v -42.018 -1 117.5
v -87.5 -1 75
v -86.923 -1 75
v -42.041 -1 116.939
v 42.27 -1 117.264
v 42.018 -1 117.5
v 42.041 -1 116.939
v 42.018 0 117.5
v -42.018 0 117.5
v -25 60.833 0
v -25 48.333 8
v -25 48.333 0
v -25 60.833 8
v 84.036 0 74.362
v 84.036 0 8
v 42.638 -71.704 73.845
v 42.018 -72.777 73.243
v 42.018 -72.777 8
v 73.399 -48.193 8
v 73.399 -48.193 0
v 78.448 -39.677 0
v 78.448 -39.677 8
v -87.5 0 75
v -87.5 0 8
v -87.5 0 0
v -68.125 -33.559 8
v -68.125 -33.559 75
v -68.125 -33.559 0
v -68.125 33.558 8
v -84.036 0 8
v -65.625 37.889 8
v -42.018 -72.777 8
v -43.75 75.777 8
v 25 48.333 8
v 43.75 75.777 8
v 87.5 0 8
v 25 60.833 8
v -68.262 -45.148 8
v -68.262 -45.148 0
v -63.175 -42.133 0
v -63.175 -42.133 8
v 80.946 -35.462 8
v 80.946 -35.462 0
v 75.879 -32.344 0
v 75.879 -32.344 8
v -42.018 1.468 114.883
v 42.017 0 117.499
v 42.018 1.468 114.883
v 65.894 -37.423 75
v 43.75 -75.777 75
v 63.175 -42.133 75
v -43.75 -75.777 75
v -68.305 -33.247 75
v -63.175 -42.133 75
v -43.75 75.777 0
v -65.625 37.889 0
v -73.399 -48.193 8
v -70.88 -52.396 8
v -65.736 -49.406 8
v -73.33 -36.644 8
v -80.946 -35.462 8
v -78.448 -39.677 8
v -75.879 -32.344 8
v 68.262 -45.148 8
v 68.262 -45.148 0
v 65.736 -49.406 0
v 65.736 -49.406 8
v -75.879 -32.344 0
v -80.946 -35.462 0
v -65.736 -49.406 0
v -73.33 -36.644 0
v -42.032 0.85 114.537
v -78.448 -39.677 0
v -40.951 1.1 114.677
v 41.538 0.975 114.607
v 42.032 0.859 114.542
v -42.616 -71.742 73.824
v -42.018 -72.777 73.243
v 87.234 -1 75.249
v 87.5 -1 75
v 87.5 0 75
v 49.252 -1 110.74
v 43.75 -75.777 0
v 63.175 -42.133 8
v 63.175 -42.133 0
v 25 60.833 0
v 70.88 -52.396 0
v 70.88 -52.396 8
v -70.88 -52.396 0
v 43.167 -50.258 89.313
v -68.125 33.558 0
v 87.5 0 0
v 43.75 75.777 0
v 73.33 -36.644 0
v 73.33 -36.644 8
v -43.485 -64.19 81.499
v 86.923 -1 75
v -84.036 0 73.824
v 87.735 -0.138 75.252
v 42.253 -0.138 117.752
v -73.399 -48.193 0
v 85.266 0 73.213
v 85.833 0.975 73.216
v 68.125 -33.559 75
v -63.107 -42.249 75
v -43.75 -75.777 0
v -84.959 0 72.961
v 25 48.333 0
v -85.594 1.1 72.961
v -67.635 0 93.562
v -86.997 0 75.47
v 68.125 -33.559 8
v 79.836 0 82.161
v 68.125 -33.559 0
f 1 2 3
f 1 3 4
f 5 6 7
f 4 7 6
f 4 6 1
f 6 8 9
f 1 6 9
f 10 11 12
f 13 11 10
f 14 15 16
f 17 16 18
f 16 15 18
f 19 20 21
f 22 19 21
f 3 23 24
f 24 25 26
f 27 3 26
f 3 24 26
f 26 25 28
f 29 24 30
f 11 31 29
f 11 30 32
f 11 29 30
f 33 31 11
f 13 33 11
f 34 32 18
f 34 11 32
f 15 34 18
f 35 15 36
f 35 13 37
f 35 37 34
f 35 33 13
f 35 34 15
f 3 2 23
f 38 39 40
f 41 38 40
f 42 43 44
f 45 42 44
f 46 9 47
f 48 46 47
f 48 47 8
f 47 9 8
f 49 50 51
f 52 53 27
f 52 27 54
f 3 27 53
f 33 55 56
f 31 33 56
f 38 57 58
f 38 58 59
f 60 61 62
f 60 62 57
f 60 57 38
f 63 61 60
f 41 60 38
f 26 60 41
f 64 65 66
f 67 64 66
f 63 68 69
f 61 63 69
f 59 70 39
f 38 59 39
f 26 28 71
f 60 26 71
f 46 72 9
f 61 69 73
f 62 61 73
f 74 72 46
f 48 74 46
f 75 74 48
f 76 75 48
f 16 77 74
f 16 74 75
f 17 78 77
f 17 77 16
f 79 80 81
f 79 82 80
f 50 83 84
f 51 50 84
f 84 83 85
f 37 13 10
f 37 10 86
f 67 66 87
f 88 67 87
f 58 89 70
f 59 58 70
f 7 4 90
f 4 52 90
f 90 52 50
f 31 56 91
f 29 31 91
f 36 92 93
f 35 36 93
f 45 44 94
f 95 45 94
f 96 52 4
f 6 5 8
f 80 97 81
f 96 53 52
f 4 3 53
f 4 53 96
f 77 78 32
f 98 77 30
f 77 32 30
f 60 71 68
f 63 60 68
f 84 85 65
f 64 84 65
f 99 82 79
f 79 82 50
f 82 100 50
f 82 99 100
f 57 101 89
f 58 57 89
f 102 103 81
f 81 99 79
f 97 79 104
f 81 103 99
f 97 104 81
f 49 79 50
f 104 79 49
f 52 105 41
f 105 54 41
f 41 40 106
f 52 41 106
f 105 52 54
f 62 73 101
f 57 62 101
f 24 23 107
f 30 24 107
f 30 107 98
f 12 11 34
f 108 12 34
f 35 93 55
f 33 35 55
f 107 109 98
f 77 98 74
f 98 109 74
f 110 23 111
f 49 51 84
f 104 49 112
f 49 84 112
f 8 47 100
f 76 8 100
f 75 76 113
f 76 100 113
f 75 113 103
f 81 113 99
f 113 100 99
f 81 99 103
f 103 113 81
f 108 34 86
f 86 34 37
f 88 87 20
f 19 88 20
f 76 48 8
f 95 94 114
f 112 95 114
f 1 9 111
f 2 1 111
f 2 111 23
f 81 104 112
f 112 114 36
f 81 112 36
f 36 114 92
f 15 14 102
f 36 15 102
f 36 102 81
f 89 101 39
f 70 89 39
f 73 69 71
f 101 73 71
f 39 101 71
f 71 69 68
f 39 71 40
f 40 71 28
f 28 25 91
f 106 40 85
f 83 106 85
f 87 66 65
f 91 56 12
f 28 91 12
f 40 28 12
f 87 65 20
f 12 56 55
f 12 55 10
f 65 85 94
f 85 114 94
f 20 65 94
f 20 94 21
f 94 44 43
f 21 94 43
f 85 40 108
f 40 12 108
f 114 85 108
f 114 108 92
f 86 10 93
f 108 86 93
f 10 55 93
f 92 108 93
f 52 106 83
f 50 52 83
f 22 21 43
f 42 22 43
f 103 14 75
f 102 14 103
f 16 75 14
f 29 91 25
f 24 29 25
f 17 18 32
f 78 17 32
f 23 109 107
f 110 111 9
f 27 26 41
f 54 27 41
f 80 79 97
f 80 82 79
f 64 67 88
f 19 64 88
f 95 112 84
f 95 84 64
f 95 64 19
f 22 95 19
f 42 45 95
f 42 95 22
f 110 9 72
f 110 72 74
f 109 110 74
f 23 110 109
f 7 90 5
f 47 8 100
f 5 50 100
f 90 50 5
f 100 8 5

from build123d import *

# Parameters (mm, degrees)
F0_W      = 50
F0_H      = 12.5
F1_DEPTH  = 8
F2_DEPTH  = 75
F4_DEPTH  = 8
F7_DEPTH  = 3
F8_DEPTH  = 1
F11_DEPTH = 3
F14_DEPTH = 3
F15_DEPTH = 8
F16_DEPTH = 8
F17_DEPTH = 12.5


with BuildPart() as f1:
    # F0 (on Top) → F1 (new body)
    with BuildSketch(Plane.XY):
        Polygon((42.017949, -72.777223), (84.035898, 0), (42.017949, 72.777223), (-42.017949, 72.777223), (-84.035898, 0), (-42.017949, -72.777223), align=None)
        with Locations((0, 54.582917)):
            Rectangle(F0_W, F0_H, mode=Mode.SUBTRACT)
    extrude(amount=F1_DEPTH)

    # F0 (on Top) → F2 (join)
    with BuildSketch(Plane.XY):
        Polygon((68.124673, -33.55905), (87.5, 0), (84.035898, 0), (42.017949, -72.777223), (-42.017949, -72.777223), (-84.035898, 0), (-87.5, 0), (-68.124673, -33.55905), (-63.174512, -42.132981), (-43.75, -75.777223), (43.75, -75.777223), (63.174512, -42.132981), align=None)
    extrude(amount=F2_DEPTH)

    # F0 (on Top) → F4 (join)
    with BuildSketch(Plane.XY):
        Polygon((43.75, 75.777223), (-43.75, 75.777223), (-65.625, 37.888611), (-68.125, 33.558484), (-87.5, 0), (-84.035898, 0), (-42.017949, 72.777223), (42.017949, 72.777223), (84.035898, 0), (87.5, 0), align=None)
    extrude(amount=F4_DEPTH)

    # F6 (on face) → F7 (join)
    with BuildSketch(Plane(origin=(0, -50.131237, 89.383668), x_dir=(1, 0, 0), z_dir=(0, 0.489171, -0.872188))):
        Polygon((43.75, 29.404192), (0, 29.404192), (-43.75, 29.404192), (-42.01795, -57.477552), (42.01795, -57.477552), align=None)
    extrude(amount=F7_DEPTH)

    # F3 (on Front) → F8 (join)
    with BuildSketch(Plane.XZ):
        Polygon((-42.01795, 114.5), (0, 114.5), (42.01795, 114.5), (84.0359, 75), (87.5, 75), (42.01795, 117.5), (0, 117.5), (-42.01795, 117.5), (-87.5, 75), (-84.0359, 75), align=None)
    extrude(amount=F8_DEPTH)

    # F10 (on face) → F11 (join)
    with BuildSketch(Plane(origin=(-67.684673, -39.077764, 72.433827), x_dir=(0.772363, -0.301588, 0.559017), z_dir=(-0.635181, -0.366722, 0.67975))):
        Polygon((33.231426, 55.789645), (-25.65546, 35.610412), (30.988892, -31.080422), align=None)
    extrude(amount=-F11_DEPTH)

    # F13 (on face) → F14 (join)
    with BuildSketch(Plane(origin=(67.675669, -39.595085, 72.424192), x_dir=(0.773305, 0.304147, -0.556322), z_dir=(-0.634035, 0.370955, -0.678522))):
        Polygon((-30.93951, 30.511739), (-32.875165, -56.364915), (25.940007, -35.977606), align=None)
    extrude(amount=F14_DEPTH)

    # F0 (on Top) → F15 (join)
    with BuildSketch(Plane.XY):
        with Locations((0, 54.582917)):
            Rectangle(F0_W, F0_H)
    extrude(amount=F15_DEPTH)

    # F0 (on Top) → F16 (join)
    with BuildSketch(Plane.XY):
        Polygon((-78.447809, -39.67729), (-73.329958, -36.64408), (-75.878554, -32.343907), (-80.946091, -35.46201), align=None)
        Polygon((-63.174512, -42.132981), (-68.124673, -33.55905), (-73.329958, -36.64408), (-78.447809, -39.67729), (-73.398516, -48.192843), (-68.261641, -45.14817), align=None)
        Polygon((-65.73638, -49.405581), (-68.261641, -45.14817), (-73.398516, -48.192843), (-70.880193, -52.396181), align=None)
        Polygon((75.878554, -32.343907), (73.329958, -36.64408), (78.447809, -39.67729), (80.946091, -35.46201), align=None)
        Polygon((73.329958, -36.64408), (68.124673, -33.55905), (63.174512, -42.132981), (68.261641, -45.14817), (73.398516, -48.192843), (78.447809, -39.67729), align=None)
        Polygon((73.398516, -48.192843), (68.261641, -45.14817), (65.73638, -49.405581), (70.880193, -52.396181), align=None)
    extrude(amount=F16_DEPTH)

    # F0 (on Top) → F17 (cut, symmetric)
    with BuildSketch(Plane.XY):
        with Locations((0, 54.582917)):
            Rectangle(F0_W, F0_H)
    extrude(amount=F17_DEPTH, both=True, mode=Mode.SUBTRACT)


solid = f1.part
